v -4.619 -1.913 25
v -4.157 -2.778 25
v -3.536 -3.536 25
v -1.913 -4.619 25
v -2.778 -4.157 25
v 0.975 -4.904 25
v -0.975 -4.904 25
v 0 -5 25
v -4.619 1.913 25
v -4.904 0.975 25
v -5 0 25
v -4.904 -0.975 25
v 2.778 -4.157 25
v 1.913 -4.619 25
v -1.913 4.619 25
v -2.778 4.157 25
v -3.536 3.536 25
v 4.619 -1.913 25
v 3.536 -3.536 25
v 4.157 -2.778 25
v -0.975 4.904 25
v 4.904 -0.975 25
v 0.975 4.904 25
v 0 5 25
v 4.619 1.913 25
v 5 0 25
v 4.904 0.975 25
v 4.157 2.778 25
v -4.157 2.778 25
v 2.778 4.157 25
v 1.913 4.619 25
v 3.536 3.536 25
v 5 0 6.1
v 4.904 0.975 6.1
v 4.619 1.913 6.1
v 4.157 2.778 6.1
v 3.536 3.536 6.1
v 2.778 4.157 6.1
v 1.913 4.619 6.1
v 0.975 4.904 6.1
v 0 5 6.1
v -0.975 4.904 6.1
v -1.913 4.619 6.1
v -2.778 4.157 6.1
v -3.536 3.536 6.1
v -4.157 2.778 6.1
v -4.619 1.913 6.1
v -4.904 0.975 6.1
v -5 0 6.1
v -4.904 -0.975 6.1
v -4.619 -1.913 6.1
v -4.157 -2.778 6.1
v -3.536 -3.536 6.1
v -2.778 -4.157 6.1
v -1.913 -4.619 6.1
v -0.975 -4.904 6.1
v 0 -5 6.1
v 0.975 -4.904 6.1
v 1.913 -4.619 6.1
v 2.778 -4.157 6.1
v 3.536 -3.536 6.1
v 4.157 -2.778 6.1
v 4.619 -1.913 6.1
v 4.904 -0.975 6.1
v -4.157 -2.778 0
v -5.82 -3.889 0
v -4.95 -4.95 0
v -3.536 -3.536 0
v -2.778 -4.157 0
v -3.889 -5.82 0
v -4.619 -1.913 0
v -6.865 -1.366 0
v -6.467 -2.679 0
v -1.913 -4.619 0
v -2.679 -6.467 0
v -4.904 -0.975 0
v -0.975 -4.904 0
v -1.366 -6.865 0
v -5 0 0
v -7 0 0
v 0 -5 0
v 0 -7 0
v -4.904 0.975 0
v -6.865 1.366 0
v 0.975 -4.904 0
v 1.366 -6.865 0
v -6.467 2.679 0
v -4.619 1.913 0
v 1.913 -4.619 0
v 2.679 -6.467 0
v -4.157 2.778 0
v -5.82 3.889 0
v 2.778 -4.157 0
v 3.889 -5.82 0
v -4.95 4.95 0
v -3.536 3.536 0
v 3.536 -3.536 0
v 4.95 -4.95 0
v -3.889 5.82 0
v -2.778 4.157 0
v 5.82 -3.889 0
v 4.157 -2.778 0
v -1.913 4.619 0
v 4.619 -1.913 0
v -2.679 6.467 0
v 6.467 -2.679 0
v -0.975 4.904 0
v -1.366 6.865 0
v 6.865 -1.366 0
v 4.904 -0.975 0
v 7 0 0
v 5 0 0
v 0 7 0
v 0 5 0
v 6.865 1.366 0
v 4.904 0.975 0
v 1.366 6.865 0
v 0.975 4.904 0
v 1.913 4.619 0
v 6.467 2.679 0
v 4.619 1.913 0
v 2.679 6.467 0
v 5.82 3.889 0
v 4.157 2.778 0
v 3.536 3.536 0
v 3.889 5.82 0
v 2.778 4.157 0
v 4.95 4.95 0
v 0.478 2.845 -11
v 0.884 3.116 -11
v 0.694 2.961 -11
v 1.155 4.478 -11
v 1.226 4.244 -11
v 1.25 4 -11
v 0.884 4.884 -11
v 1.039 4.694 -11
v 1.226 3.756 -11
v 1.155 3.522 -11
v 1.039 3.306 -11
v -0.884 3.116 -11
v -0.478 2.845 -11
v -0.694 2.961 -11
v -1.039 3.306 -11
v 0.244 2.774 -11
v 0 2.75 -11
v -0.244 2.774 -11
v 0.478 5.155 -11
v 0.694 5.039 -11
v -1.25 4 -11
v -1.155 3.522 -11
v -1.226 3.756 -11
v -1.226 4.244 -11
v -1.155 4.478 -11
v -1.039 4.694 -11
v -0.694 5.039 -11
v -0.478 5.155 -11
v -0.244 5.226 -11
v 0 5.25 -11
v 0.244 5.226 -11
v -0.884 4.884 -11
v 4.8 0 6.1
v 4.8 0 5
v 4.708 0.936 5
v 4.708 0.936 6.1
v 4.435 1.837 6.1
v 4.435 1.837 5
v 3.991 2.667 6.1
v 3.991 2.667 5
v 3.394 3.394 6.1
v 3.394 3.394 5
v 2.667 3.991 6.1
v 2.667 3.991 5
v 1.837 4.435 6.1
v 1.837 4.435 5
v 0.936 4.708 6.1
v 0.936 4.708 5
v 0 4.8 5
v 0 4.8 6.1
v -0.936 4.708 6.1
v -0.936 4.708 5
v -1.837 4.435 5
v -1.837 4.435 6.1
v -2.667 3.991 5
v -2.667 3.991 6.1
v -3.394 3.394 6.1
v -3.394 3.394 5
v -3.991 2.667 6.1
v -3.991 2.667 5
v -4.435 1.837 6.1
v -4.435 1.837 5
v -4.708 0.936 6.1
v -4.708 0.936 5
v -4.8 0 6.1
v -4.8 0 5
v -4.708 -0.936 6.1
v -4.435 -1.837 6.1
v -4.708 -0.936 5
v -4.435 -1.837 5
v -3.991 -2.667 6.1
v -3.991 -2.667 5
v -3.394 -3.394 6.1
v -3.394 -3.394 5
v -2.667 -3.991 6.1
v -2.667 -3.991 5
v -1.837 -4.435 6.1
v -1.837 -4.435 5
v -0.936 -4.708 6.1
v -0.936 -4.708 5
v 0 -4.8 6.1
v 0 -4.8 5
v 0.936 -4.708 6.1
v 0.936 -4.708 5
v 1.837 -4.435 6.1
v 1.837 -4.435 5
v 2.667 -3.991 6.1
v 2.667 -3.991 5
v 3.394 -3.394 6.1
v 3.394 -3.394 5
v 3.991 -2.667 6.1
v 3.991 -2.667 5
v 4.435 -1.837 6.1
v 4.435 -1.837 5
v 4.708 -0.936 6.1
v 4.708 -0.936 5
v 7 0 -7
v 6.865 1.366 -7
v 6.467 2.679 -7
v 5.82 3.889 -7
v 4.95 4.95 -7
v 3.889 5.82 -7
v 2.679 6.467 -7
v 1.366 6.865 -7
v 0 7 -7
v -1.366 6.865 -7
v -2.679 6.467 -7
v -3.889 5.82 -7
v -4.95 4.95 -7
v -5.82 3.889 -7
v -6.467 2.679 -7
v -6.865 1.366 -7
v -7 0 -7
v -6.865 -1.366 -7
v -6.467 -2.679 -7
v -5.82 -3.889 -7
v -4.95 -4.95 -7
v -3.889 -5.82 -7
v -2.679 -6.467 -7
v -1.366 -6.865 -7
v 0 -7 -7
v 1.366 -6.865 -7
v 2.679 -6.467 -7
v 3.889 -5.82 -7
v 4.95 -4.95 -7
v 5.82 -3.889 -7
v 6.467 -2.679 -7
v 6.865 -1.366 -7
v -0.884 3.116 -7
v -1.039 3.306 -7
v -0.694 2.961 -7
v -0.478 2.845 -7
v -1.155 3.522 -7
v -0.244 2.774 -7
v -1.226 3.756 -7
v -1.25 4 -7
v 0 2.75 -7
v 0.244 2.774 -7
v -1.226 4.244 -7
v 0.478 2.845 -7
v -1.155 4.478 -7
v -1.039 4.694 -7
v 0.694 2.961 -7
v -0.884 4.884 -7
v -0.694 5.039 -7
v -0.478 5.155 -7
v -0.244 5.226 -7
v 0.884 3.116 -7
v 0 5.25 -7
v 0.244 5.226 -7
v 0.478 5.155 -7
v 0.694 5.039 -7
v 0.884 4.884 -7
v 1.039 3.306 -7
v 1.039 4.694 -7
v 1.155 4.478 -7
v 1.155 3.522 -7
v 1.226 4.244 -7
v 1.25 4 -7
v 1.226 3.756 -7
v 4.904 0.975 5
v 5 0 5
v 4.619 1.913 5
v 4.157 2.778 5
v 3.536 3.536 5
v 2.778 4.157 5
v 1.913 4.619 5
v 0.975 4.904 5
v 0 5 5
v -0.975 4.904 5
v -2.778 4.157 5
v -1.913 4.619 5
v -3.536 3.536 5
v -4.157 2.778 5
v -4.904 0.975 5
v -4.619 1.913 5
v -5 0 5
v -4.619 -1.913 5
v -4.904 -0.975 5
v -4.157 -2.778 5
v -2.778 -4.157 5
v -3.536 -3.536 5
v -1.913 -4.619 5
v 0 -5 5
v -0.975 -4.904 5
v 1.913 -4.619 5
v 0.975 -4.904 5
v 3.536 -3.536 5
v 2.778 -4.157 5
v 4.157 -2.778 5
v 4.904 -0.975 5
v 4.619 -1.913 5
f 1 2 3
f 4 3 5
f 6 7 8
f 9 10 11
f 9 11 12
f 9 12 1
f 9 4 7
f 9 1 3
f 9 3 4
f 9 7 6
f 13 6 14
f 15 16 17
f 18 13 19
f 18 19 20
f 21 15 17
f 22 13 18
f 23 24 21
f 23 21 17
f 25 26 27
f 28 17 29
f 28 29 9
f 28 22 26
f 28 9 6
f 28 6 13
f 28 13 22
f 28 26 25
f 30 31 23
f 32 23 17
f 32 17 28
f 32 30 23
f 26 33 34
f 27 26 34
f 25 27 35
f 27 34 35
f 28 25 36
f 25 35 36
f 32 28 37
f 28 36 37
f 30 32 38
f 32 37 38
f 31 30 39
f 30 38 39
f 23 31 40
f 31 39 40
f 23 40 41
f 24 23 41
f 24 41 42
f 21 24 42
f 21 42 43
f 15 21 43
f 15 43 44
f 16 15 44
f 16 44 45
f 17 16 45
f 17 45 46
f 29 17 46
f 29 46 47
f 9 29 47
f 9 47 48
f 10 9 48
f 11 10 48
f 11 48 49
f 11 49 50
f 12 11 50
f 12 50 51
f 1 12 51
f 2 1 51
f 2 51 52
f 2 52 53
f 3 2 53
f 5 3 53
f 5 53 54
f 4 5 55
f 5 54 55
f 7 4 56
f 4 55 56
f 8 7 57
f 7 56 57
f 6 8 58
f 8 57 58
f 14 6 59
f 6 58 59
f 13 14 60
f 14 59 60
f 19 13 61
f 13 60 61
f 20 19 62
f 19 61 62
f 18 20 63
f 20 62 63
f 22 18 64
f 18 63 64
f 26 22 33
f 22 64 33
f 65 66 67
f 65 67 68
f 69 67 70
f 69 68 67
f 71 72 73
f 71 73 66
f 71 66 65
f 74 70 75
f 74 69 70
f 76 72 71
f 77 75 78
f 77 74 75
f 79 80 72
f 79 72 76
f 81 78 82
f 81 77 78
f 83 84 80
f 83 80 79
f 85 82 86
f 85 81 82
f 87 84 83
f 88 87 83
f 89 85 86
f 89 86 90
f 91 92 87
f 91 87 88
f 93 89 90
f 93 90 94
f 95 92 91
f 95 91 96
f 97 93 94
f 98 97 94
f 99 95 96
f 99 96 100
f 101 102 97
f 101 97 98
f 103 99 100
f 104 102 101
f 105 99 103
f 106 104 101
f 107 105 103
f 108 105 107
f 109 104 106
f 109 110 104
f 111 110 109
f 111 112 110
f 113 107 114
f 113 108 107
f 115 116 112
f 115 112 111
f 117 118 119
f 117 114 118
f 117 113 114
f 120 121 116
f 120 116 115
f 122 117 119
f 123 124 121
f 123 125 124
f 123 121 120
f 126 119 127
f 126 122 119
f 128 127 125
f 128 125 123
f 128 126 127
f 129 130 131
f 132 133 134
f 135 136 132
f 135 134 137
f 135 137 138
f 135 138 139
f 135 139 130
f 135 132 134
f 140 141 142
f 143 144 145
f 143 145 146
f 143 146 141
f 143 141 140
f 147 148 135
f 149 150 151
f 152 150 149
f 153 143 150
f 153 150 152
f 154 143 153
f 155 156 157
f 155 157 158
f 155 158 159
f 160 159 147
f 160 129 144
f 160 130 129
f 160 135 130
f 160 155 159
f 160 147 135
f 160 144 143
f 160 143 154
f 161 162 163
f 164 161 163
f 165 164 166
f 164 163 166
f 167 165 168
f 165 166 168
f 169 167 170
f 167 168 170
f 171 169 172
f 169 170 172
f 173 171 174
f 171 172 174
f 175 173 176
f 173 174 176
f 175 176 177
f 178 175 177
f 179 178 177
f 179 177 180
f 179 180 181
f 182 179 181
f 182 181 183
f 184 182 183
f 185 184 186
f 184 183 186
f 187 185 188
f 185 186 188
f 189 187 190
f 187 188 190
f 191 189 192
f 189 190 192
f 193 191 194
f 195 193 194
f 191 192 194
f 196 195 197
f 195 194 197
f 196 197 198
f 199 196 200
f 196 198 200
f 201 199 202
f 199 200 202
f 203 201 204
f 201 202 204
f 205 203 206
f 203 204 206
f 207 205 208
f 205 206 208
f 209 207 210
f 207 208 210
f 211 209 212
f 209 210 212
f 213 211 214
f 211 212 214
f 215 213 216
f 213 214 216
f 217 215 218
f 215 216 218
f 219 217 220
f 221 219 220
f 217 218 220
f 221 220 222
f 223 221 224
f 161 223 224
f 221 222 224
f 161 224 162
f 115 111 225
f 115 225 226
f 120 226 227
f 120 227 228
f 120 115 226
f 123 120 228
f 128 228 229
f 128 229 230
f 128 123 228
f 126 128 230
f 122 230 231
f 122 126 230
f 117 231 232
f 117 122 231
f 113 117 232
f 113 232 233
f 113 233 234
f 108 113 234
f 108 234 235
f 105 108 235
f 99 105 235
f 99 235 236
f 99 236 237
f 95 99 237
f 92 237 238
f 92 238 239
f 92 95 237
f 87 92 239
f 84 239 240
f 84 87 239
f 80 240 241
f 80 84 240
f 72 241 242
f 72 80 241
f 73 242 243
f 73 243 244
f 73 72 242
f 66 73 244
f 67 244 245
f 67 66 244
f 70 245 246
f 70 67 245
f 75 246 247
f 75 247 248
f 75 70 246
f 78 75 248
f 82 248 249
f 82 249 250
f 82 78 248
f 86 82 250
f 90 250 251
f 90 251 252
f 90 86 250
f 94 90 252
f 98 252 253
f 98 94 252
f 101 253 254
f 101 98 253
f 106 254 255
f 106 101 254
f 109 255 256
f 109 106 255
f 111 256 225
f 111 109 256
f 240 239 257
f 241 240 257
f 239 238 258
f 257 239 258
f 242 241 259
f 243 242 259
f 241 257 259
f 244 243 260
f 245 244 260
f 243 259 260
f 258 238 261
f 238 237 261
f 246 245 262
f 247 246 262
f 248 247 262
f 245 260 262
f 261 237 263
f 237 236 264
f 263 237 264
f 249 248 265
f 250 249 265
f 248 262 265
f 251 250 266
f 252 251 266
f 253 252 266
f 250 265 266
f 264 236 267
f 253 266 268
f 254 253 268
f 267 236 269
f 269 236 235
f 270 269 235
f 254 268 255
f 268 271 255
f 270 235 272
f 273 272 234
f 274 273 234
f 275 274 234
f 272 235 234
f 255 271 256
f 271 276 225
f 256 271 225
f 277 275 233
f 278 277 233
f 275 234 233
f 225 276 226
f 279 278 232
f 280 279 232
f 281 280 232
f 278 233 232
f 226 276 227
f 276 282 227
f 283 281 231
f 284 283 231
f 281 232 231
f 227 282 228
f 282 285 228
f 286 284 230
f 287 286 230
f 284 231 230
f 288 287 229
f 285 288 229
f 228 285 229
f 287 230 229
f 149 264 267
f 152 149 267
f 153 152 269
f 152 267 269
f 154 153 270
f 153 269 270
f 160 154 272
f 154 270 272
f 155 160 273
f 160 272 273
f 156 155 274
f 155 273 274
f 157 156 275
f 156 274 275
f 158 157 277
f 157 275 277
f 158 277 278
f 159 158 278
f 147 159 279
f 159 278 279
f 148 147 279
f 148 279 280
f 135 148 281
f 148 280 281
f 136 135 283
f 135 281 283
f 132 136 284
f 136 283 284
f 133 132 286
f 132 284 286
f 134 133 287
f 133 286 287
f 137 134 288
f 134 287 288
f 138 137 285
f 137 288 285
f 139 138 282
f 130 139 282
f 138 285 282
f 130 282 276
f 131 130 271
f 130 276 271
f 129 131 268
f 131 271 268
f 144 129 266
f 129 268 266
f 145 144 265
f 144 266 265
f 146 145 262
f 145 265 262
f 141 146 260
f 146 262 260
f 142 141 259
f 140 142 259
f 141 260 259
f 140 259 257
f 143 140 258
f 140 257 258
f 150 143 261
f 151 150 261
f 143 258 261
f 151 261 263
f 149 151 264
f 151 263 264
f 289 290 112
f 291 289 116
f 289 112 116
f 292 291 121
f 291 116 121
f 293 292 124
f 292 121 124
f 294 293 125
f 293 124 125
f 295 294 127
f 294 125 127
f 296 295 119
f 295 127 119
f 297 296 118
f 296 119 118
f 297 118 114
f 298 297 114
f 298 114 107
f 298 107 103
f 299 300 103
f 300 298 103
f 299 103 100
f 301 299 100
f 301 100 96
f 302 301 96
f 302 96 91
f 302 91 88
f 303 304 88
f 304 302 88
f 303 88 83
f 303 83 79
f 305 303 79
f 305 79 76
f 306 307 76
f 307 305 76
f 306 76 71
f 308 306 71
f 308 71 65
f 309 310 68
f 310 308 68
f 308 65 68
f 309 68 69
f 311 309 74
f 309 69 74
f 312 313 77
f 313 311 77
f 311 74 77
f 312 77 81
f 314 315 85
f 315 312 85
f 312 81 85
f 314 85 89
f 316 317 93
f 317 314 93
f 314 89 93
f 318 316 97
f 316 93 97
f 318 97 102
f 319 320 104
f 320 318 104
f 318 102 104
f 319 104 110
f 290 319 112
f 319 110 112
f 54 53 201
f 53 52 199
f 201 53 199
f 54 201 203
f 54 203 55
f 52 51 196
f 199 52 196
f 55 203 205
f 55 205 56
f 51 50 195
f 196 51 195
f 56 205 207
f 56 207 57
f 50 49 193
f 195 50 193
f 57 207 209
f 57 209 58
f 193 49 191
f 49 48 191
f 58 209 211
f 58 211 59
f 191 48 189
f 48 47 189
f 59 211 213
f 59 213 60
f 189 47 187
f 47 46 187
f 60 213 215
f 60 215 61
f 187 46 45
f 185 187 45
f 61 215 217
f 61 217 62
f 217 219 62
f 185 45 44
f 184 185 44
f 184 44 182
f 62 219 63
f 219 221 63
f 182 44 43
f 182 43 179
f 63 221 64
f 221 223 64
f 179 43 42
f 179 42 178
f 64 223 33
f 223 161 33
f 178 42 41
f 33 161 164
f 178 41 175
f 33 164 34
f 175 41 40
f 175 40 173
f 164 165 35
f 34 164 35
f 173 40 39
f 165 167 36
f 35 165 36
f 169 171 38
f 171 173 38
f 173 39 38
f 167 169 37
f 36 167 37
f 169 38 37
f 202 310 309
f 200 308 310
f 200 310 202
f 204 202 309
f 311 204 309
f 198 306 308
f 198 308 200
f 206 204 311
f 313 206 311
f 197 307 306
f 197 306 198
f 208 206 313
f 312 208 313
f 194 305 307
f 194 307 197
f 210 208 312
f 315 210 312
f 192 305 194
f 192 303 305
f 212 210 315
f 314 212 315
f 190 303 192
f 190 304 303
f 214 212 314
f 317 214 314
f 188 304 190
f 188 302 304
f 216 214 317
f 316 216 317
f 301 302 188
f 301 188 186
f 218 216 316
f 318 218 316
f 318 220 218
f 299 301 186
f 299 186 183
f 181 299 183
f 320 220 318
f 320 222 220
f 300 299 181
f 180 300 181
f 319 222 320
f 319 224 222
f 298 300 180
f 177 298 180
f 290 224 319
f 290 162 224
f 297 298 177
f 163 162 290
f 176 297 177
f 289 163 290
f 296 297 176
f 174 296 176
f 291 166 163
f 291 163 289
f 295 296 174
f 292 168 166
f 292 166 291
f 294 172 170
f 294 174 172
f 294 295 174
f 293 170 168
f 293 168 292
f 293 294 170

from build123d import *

# Parameters (mm, degrees)
SKETCH1_R           = 7
BOSS_EXTRUDE1_DEPTH = 7
SKETCH2_R           = 5
BOSS_EXTRUDE2_DEPTH = 25
SKETCH3_R           = 6
SKETCH3_R_2         = 4.8
CUT_EXTRUDE1_DEPTH  = 1.1
SKETCH4_R           = 1.25
BOSS_EXTRUDE3_DEPTH = 4


with BuildPart() as part:
    # Sketch1 → Boss-Extrude1 (new body)
    with BuildSketch(Plane.XY):
        Circle(SKETCH1_R)
    extrude(amount=-BOSS_EXTRUDE1_DEPTH)

    # Sketch2 → Boss-Extrude2 (add)
    with BuildSketch(Plane.XY):
        Circle(SKETCH2_R)
    extrude(amount=BOSS_EXTRUDE2_DEPTH)

    # Sketch3 → Cut-Extrude1 (cut)
    with BuildSketch(Plane.XY.offset(5)):
        Circle(SKETCH3_R)
        Circle(SKETCH3_R_2, mode=Mode.SUBTRACT)
    extrude(amount=CUT_EXTRUDE1_DEPTH, mode=Mode.SUBTRACT)

    # Sketch4 → Boss-Extrude3 (add)
    with BuildSketch(Plane(origin=(0, 0, -7), x_dir=(-1, 0, 0), z_dir=(0, 0, -1))):
        with Locations((0, 4)):
            Circle(SKETCH4_R)
    extrude(amount=BOSS_EXTRUDE3_DEPTH)


solid = part.part
